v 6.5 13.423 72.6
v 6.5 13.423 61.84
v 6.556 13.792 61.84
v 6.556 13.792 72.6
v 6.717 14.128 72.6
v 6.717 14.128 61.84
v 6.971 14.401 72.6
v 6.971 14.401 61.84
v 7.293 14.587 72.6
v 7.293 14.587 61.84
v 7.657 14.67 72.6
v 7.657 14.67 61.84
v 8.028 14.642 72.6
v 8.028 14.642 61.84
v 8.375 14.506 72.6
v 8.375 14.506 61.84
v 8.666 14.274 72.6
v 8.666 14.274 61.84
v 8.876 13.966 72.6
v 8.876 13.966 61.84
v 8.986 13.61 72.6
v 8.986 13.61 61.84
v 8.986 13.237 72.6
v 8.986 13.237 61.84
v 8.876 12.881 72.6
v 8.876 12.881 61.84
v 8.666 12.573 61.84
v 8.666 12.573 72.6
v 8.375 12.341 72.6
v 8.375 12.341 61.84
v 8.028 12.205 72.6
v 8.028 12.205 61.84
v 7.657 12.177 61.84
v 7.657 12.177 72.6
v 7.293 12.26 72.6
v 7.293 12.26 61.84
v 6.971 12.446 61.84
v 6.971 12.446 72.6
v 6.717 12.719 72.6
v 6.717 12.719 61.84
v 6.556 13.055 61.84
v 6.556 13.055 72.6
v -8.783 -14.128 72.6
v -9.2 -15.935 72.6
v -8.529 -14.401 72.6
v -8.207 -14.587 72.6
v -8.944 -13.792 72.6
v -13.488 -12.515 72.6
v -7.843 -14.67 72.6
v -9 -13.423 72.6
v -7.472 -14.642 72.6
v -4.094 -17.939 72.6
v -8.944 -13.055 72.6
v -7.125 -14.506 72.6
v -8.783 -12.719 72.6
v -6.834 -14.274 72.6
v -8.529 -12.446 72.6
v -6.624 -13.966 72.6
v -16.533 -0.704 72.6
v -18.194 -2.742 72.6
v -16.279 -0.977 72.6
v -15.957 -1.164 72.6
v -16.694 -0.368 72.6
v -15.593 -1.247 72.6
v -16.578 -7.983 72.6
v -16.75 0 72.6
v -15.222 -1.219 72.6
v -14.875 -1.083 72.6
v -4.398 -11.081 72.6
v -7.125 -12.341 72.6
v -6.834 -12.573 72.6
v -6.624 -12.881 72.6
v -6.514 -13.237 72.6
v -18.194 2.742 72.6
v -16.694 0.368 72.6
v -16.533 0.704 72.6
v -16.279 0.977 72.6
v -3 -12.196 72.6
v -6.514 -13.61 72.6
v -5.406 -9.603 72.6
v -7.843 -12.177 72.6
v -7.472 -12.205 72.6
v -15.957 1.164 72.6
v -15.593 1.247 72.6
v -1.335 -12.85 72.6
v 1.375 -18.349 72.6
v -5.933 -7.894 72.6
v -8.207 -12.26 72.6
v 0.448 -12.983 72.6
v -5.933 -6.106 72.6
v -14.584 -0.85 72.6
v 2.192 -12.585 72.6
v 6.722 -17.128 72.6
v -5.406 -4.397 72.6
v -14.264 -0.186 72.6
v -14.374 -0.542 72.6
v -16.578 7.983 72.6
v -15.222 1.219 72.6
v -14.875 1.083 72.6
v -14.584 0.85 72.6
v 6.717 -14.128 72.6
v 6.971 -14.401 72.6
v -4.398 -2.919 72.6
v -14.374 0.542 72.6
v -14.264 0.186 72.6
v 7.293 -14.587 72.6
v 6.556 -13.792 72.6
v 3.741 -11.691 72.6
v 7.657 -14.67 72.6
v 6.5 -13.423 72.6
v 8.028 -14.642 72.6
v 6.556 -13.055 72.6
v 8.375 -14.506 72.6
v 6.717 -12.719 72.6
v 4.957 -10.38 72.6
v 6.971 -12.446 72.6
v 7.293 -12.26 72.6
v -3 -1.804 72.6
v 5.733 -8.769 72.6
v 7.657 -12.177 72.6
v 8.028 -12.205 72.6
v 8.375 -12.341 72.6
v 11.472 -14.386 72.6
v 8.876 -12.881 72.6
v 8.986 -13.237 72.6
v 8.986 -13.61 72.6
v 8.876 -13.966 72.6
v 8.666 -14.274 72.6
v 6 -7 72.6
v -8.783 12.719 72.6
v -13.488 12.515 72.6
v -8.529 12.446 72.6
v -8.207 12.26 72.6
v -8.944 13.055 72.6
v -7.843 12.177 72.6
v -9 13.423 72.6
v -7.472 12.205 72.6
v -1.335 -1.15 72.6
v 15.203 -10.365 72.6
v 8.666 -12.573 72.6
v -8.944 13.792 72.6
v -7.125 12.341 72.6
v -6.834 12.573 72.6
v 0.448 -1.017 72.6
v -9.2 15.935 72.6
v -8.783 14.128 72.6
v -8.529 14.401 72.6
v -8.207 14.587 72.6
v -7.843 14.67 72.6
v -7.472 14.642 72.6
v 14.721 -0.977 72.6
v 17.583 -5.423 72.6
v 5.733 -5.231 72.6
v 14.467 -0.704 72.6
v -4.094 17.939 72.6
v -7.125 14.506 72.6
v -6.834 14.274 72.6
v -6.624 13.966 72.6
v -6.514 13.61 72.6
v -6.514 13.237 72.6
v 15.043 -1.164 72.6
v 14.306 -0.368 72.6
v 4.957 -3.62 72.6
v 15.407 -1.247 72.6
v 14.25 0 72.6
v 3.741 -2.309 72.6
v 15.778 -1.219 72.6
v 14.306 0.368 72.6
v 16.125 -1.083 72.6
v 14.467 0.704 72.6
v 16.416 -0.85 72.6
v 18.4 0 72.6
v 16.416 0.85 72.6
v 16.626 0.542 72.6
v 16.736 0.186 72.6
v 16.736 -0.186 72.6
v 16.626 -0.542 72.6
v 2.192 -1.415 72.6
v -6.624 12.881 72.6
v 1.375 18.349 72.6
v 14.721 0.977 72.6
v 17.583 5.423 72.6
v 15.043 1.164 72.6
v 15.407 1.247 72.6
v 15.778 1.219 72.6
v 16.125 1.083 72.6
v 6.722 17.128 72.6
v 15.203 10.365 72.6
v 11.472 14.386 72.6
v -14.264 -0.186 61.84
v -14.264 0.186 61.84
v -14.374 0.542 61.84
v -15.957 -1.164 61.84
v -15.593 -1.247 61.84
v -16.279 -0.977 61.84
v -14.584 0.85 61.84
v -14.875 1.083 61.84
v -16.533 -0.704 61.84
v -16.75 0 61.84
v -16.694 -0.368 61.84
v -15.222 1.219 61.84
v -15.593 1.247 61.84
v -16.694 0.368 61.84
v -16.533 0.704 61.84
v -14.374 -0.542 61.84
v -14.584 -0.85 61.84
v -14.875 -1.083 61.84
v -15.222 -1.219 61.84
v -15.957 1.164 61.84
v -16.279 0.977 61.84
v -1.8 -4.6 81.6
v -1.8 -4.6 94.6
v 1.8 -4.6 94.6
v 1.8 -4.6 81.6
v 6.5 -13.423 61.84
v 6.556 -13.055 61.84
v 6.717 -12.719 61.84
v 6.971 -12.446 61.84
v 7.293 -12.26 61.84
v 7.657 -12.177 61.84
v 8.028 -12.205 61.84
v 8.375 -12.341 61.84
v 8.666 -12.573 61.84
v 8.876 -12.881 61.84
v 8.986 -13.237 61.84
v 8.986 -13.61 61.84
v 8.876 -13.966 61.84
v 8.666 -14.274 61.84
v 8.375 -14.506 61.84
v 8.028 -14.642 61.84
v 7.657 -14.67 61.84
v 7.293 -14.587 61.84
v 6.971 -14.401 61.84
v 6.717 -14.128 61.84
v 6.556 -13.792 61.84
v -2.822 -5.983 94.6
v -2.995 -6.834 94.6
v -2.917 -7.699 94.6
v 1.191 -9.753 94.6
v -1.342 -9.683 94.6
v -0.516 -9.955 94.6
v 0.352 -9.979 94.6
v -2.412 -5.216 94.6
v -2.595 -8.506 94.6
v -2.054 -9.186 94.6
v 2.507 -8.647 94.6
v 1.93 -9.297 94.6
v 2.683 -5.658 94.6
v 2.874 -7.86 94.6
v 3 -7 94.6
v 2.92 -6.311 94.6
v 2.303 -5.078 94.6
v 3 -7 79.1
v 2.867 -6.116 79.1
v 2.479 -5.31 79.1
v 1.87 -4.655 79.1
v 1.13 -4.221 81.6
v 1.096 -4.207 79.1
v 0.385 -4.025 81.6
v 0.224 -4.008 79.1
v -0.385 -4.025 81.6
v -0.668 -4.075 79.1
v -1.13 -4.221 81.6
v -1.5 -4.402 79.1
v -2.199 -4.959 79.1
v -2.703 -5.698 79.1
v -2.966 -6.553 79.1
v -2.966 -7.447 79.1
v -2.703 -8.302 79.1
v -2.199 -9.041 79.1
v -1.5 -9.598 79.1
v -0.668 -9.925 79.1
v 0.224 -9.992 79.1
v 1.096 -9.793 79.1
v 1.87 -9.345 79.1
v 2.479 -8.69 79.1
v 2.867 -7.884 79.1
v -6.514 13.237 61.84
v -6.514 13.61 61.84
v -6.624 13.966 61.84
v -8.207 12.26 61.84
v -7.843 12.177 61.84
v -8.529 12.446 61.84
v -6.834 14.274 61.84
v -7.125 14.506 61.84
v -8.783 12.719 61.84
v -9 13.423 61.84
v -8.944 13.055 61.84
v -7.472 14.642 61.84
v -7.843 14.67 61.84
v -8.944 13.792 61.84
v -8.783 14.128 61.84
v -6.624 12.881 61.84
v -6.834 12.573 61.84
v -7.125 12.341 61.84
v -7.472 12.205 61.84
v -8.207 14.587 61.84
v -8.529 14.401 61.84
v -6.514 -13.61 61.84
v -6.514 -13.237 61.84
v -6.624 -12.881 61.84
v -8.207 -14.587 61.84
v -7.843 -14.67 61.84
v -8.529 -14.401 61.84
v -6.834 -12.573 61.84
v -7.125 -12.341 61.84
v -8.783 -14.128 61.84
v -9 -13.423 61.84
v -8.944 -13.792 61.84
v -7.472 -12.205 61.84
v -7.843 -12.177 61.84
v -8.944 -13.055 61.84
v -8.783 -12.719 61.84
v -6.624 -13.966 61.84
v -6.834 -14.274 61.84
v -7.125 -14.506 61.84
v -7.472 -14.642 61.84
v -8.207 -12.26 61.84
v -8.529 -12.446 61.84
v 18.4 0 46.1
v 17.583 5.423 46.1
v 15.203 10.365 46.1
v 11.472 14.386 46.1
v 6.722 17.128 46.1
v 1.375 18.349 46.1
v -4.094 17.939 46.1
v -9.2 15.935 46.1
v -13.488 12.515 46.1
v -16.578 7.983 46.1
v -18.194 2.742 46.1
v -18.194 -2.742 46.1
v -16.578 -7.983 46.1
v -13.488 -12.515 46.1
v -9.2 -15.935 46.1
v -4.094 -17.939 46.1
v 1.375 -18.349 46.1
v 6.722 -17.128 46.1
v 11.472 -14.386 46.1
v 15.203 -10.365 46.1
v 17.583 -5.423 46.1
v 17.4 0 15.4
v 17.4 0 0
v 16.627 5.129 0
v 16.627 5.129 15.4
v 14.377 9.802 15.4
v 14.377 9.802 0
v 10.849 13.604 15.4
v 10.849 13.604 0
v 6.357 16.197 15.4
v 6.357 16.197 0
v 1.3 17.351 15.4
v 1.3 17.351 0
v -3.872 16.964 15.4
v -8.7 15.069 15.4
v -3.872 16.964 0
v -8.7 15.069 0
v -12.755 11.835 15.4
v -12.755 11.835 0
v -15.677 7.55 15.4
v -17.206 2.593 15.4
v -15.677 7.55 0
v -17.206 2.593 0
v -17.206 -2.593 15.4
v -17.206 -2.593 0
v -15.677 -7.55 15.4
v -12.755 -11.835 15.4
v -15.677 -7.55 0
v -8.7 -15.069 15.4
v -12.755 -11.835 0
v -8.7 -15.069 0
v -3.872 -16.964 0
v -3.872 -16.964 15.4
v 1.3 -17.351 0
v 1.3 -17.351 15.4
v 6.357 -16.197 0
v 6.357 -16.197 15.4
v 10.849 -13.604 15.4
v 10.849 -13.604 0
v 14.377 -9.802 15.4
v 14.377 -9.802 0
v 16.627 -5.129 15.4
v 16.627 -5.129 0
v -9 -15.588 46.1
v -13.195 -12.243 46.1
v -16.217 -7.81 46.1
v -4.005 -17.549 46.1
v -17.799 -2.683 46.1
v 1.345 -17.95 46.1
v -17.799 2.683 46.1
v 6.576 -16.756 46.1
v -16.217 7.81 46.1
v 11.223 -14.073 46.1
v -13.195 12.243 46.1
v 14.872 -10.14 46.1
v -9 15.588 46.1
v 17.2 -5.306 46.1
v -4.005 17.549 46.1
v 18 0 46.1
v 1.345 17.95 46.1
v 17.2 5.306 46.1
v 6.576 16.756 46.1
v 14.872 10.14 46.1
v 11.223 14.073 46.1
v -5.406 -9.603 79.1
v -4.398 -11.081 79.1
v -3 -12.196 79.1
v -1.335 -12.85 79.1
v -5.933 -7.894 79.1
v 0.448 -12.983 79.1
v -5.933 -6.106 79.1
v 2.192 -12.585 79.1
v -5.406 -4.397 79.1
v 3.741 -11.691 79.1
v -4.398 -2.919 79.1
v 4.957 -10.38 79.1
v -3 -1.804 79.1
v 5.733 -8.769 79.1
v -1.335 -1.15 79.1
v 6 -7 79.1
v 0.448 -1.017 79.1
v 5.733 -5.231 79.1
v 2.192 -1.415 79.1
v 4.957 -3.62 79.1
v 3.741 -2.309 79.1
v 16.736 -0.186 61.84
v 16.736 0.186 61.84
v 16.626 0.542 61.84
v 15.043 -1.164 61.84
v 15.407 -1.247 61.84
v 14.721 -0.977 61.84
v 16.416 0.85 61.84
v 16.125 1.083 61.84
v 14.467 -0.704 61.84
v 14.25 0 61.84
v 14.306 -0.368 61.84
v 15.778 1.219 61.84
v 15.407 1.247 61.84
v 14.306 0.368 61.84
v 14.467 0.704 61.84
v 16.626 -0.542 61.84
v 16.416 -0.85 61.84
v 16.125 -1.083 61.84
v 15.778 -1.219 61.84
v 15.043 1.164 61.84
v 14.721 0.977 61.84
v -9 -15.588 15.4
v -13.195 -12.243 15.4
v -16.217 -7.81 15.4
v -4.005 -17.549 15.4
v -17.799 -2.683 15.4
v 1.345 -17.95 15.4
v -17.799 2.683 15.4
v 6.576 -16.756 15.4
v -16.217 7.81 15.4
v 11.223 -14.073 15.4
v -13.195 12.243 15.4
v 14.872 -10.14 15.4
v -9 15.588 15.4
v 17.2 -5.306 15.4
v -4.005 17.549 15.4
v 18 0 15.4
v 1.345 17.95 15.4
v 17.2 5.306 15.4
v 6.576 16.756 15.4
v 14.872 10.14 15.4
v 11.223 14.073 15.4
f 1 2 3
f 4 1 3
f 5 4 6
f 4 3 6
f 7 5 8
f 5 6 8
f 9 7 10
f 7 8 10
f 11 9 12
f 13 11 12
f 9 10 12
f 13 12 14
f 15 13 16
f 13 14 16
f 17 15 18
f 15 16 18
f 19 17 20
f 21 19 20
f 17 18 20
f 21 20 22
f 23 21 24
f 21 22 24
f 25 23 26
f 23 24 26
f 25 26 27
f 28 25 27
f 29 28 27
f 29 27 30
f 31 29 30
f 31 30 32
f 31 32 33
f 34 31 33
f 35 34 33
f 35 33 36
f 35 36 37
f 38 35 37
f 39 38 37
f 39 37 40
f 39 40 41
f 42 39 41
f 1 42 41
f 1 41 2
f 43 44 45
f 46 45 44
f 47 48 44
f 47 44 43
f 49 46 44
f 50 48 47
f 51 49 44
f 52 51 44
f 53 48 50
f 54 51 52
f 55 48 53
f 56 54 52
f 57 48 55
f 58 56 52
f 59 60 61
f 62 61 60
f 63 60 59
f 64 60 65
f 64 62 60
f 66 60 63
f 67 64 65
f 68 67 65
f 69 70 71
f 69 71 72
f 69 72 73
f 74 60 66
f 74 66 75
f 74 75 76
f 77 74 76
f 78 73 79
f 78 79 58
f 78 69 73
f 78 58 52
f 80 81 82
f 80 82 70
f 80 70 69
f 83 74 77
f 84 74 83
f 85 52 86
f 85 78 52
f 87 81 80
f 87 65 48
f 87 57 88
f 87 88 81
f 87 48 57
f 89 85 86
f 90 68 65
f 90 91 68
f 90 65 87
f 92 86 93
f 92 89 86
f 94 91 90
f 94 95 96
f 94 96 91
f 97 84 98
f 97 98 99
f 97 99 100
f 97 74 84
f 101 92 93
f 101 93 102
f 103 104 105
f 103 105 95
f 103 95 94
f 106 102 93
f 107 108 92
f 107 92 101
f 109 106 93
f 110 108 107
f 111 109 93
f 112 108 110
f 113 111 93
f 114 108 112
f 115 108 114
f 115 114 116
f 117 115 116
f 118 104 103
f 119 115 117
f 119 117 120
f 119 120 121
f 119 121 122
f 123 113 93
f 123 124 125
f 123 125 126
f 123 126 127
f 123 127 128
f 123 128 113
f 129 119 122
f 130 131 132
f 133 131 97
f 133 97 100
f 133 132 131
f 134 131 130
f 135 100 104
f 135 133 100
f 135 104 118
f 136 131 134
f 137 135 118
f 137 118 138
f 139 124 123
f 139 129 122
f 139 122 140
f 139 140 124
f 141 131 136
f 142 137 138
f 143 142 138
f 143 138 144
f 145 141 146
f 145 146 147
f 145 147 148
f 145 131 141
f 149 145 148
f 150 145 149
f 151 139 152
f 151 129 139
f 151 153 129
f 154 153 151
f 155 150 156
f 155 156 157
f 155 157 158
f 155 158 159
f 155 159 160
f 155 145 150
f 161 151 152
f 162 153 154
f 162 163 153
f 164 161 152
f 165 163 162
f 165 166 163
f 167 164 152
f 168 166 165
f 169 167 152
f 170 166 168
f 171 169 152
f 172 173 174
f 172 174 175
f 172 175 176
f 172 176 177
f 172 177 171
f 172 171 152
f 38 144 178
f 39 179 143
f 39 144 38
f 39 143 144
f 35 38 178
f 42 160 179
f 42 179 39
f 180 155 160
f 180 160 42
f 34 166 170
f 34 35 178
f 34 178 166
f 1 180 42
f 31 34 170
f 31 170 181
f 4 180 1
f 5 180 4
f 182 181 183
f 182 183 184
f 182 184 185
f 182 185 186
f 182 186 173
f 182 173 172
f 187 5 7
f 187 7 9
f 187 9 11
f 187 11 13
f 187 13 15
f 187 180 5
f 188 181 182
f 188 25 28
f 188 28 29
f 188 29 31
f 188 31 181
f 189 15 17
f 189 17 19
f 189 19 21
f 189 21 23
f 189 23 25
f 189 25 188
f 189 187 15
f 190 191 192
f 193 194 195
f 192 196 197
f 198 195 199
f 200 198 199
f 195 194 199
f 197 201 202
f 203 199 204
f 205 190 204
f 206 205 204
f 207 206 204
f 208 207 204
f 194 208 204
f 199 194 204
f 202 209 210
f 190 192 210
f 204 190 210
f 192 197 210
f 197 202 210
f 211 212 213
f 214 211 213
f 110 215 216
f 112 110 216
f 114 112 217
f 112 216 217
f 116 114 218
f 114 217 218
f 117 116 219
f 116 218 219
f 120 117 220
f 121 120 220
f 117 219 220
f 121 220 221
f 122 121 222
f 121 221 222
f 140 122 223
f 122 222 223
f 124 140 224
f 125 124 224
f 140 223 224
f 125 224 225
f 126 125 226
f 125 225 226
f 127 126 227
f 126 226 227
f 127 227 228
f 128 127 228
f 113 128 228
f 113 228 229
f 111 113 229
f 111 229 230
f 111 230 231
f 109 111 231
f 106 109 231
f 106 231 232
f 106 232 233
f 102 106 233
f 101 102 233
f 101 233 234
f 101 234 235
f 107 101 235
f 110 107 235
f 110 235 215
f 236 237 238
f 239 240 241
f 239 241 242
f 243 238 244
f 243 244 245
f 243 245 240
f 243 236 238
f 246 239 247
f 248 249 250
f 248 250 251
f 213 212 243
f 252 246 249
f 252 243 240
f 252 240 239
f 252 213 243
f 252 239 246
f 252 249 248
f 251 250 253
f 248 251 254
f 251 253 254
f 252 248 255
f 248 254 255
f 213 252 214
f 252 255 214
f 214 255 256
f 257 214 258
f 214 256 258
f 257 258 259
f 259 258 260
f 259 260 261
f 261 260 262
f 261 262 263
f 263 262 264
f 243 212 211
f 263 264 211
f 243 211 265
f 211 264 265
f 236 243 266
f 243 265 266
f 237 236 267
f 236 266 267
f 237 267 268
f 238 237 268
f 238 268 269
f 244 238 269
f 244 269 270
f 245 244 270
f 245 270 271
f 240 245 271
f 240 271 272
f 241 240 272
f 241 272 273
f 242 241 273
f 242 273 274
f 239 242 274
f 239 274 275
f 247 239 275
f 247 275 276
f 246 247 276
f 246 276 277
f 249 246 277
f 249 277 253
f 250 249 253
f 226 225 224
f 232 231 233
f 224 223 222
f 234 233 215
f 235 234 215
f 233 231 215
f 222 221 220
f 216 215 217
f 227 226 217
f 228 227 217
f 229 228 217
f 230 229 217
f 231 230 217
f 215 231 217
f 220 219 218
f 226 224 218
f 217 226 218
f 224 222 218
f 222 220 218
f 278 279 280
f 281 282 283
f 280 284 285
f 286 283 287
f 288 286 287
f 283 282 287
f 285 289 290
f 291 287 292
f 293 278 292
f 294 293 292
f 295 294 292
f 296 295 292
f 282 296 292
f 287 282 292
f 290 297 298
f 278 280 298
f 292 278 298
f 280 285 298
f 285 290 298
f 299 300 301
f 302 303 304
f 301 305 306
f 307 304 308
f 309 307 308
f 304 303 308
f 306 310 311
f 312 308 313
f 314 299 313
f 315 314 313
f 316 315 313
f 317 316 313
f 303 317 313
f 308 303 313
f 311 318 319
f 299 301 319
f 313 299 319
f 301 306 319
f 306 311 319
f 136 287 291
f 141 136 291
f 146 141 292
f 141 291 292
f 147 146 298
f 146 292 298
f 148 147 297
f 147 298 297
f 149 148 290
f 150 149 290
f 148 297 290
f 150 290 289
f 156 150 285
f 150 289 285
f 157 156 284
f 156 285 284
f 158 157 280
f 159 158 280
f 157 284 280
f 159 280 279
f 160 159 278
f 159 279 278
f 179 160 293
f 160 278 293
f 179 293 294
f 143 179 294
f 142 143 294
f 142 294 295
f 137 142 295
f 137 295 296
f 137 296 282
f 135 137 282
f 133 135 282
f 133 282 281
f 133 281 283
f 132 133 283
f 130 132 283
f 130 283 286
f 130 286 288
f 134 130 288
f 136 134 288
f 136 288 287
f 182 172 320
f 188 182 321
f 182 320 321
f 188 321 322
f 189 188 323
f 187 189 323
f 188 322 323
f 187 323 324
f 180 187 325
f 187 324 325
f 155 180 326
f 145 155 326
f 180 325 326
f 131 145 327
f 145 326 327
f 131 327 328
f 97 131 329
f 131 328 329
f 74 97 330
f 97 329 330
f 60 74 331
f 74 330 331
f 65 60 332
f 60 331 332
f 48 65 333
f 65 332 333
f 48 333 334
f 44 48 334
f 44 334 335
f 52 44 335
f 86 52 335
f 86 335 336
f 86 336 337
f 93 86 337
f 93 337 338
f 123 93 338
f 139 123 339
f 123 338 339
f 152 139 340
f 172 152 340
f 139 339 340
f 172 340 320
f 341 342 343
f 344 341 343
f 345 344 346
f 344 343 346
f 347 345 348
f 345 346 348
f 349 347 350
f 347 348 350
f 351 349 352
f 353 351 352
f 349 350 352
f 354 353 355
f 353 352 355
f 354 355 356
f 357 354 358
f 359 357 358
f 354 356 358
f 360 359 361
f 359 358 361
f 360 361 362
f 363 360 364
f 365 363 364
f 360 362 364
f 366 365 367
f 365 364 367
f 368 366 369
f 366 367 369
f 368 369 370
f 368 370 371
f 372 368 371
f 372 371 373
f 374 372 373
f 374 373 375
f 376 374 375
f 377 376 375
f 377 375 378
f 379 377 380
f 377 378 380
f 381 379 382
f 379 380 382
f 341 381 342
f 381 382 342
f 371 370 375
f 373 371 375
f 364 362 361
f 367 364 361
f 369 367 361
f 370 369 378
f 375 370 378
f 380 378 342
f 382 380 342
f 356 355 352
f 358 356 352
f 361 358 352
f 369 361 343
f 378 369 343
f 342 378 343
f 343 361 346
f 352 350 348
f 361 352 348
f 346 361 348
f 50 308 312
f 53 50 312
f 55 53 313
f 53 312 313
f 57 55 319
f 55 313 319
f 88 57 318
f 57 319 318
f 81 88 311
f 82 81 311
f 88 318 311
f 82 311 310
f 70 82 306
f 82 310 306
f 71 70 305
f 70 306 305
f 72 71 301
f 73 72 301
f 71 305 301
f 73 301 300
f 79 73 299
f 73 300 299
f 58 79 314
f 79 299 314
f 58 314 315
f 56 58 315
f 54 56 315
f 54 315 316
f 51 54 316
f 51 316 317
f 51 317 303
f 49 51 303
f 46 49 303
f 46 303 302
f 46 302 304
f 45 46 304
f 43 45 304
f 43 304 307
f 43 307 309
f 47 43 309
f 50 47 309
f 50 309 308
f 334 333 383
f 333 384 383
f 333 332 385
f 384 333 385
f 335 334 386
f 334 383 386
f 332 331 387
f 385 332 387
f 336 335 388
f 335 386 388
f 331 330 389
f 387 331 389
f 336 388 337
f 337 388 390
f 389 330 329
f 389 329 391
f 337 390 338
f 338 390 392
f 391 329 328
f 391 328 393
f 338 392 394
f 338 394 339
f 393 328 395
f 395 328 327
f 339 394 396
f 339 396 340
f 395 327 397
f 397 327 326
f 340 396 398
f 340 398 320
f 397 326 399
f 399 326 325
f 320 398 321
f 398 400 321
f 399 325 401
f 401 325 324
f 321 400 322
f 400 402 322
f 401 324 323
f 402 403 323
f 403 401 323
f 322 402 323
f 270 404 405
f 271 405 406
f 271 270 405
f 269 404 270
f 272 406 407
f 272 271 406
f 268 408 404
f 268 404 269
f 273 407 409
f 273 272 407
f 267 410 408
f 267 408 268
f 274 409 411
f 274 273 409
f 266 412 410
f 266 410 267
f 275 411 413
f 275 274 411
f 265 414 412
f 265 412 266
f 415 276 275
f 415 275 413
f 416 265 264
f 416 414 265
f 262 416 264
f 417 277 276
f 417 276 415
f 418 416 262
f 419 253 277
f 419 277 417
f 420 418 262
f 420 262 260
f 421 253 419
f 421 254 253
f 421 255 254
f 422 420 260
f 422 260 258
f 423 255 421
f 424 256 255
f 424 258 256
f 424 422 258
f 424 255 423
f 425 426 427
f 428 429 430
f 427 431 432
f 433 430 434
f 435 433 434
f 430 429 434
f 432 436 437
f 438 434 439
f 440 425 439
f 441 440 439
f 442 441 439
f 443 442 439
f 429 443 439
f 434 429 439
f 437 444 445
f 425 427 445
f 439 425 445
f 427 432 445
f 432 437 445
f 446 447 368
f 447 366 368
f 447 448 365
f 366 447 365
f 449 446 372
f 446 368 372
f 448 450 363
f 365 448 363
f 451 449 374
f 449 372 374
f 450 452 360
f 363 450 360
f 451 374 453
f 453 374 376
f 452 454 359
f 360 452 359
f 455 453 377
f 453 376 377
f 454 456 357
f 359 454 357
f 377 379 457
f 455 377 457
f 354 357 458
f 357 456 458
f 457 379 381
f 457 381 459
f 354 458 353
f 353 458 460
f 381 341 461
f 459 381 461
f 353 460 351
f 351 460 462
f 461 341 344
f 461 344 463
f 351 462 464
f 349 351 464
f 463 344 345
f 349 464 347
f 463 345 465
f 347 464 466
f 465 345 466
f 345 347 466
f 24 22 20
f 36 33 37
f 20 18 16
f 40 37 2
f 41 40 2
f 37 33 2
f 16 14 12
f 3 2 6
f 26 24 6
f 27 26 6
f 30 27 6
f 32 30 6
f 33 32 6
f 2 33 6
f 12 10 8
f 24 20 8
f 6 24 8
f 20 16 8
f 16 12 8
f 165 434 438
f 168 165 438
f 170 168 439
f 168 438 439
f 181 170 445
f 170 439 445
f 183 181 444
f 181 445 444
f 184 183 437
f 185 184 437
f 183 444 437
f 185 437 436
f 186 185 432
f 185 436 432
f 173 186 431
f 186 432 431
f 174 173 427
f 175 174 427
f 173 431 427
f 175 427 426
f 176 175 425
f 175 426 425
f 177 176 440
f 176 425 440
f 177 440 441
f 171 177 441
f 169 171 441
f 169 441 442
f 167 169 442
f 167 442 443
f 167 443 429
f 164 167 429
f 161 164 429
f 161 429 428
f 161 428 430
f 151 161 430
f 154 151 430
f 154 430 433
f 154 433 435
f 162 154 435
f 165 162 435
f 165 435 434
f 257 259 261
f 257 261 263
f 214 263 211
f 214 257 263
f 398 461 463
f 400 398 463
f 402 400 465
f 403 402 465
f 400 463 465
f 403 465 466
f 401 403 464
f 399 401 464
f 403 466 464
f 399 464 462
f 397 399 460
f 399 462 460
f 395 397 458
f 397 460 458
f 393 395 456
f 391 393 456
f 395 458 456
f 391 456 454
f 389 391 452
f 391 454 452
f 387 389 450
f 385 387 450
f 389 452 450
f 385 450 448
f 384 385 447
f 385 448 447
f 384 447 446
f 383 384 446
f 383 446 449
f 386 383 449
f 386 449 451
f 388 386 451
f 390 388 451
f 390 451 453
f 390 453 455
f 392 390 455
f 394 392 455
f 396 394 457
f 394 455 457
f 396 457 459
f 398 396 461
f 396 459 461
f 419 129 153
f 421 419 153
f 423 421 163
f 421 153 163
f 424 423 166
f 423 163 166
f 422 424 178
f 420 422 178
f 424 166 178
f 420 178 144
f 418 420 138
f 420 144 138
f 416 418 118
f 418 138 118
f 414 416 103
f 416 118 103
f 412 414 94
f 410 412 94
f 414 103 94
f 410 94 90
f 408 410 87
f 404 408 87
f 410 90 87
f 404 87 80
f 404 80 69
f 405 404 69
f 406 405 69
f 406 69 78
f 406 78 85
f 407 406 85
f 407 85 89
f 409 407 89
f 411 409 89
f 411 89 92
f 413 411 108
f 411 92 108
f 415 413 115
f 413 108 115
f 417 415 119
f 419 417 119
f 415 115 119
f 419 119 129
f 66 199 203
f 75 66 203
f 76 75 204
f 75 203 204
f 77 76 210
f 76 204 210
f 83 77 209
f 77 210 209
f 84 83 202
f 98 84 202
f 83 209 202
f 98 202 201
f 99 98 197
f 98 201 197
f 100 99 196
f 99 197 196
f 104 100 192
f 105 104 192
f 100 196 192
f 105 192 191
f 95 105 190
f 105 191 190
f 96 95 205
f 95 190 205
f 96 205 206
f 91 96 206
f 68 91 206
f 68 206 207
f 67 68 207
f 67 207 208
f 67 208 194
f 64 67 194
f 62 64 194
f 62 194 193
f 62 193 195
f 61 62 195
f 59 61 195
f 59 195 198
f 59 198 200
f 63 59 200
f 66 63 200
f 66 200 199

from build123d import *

# Parameters (mm, degrees)
SKETCH1_R                       = 17.4
BOSS_EXTRUDE1_DEPTH             = 15.4
SKETCH2_R                       = 18
BOSS_EXTRUDE2_DEPTH             = 30.7
SKETCH3_R                       = 18.4
BOSS_EXTRUDE3_DEPTH             = 26.5
SKETCH4_R                       = 6
BOSS_EXTRUDE4_DEPTH             = 6.5
SKETCH5_R                       = 3
BOSS_EXTRUDE5_DEPTH             = 15.5
CUT_EXTRUDE1_DEPTH              = 13
TAP_DRILL_FOR_M3X0_5_TAP1_D     = 2.5
TAP_DRILL_FOR_M3X0_5_TAP1_DEPTH = 10.76


with BuildPart() as part:
    # Sketch1 → Boss-Extrude1 (new body)
    with BuildSketch(Plane.XY):
        Circle(SKETCH1_R)
    extrude(amount=BOSS_EXTRUDE1_DEPTH)

    # Sketch2 → Boss-Extrude2 (add)
    with BuildSketch(Plane.XY.offset(15.4)):
        Circle(SKETCH2_R)
    extrude(amount=BOSS_EXTRUDE2_DEPTH)

    # Sketch3 → Boss-Extrude3 (add)
    with BuildSketch(Plane.XY.offset(46.1)):
        Circle(SKETCH3_R)
    extrude(amount=BOSS_EXTRUDE3_DEPTH)

    # Sketch4 → Boss-Extrude4 (add)
    with BuildSketch(Plane.XY.offset(72.6)):
        with Locations((0, -7)):
            Circle(SKETCH4_R)
    extrude(amount=BOSS_EXTRUDE4_DEPTH)

    # Sketch5 → Boss-Extrude5 (add)
    with BuildSketch(Plane.XY.offset(79.1)):
        with Locations((0, -7)):
            Circle(SKETCH5_R)
    extrude(amount=BOSS_EXTRUDE5_DEPTH)

    # Sketch6 → Cut-Extrude1 (cut)
    with BuildSketch(Plane.XY.offset(94.6)):
        with BuildLine():
            Line((-1.8, -4.6), (1.8, -4.6))
            ThreePointArc((1.8, -4.6), (0, -4), (-1.8, -4.6))
        make_face()
    extrude(amount=-CUT_EXTRUDE1_DEPTH, mode=Mode.SUBTRACT)

    # Tap Drill for M3x0.5 Tap1
    with Locations(Plane.XY.offset(72.6)):
        with Locations((-15.5, 0), (-7.75, 13.423393759), (7.75, 13.423393759), (15.5, 0), (7.75, -13.423393759), (-7.75, -13.423393759)):
            Hole(TAP_DRILL_FOR_M3X0_5_TAP1_D / 2, depth=TAP_DRILL_FOR_M3X0_5_TAP1_DEPTH)


solid = part.part
